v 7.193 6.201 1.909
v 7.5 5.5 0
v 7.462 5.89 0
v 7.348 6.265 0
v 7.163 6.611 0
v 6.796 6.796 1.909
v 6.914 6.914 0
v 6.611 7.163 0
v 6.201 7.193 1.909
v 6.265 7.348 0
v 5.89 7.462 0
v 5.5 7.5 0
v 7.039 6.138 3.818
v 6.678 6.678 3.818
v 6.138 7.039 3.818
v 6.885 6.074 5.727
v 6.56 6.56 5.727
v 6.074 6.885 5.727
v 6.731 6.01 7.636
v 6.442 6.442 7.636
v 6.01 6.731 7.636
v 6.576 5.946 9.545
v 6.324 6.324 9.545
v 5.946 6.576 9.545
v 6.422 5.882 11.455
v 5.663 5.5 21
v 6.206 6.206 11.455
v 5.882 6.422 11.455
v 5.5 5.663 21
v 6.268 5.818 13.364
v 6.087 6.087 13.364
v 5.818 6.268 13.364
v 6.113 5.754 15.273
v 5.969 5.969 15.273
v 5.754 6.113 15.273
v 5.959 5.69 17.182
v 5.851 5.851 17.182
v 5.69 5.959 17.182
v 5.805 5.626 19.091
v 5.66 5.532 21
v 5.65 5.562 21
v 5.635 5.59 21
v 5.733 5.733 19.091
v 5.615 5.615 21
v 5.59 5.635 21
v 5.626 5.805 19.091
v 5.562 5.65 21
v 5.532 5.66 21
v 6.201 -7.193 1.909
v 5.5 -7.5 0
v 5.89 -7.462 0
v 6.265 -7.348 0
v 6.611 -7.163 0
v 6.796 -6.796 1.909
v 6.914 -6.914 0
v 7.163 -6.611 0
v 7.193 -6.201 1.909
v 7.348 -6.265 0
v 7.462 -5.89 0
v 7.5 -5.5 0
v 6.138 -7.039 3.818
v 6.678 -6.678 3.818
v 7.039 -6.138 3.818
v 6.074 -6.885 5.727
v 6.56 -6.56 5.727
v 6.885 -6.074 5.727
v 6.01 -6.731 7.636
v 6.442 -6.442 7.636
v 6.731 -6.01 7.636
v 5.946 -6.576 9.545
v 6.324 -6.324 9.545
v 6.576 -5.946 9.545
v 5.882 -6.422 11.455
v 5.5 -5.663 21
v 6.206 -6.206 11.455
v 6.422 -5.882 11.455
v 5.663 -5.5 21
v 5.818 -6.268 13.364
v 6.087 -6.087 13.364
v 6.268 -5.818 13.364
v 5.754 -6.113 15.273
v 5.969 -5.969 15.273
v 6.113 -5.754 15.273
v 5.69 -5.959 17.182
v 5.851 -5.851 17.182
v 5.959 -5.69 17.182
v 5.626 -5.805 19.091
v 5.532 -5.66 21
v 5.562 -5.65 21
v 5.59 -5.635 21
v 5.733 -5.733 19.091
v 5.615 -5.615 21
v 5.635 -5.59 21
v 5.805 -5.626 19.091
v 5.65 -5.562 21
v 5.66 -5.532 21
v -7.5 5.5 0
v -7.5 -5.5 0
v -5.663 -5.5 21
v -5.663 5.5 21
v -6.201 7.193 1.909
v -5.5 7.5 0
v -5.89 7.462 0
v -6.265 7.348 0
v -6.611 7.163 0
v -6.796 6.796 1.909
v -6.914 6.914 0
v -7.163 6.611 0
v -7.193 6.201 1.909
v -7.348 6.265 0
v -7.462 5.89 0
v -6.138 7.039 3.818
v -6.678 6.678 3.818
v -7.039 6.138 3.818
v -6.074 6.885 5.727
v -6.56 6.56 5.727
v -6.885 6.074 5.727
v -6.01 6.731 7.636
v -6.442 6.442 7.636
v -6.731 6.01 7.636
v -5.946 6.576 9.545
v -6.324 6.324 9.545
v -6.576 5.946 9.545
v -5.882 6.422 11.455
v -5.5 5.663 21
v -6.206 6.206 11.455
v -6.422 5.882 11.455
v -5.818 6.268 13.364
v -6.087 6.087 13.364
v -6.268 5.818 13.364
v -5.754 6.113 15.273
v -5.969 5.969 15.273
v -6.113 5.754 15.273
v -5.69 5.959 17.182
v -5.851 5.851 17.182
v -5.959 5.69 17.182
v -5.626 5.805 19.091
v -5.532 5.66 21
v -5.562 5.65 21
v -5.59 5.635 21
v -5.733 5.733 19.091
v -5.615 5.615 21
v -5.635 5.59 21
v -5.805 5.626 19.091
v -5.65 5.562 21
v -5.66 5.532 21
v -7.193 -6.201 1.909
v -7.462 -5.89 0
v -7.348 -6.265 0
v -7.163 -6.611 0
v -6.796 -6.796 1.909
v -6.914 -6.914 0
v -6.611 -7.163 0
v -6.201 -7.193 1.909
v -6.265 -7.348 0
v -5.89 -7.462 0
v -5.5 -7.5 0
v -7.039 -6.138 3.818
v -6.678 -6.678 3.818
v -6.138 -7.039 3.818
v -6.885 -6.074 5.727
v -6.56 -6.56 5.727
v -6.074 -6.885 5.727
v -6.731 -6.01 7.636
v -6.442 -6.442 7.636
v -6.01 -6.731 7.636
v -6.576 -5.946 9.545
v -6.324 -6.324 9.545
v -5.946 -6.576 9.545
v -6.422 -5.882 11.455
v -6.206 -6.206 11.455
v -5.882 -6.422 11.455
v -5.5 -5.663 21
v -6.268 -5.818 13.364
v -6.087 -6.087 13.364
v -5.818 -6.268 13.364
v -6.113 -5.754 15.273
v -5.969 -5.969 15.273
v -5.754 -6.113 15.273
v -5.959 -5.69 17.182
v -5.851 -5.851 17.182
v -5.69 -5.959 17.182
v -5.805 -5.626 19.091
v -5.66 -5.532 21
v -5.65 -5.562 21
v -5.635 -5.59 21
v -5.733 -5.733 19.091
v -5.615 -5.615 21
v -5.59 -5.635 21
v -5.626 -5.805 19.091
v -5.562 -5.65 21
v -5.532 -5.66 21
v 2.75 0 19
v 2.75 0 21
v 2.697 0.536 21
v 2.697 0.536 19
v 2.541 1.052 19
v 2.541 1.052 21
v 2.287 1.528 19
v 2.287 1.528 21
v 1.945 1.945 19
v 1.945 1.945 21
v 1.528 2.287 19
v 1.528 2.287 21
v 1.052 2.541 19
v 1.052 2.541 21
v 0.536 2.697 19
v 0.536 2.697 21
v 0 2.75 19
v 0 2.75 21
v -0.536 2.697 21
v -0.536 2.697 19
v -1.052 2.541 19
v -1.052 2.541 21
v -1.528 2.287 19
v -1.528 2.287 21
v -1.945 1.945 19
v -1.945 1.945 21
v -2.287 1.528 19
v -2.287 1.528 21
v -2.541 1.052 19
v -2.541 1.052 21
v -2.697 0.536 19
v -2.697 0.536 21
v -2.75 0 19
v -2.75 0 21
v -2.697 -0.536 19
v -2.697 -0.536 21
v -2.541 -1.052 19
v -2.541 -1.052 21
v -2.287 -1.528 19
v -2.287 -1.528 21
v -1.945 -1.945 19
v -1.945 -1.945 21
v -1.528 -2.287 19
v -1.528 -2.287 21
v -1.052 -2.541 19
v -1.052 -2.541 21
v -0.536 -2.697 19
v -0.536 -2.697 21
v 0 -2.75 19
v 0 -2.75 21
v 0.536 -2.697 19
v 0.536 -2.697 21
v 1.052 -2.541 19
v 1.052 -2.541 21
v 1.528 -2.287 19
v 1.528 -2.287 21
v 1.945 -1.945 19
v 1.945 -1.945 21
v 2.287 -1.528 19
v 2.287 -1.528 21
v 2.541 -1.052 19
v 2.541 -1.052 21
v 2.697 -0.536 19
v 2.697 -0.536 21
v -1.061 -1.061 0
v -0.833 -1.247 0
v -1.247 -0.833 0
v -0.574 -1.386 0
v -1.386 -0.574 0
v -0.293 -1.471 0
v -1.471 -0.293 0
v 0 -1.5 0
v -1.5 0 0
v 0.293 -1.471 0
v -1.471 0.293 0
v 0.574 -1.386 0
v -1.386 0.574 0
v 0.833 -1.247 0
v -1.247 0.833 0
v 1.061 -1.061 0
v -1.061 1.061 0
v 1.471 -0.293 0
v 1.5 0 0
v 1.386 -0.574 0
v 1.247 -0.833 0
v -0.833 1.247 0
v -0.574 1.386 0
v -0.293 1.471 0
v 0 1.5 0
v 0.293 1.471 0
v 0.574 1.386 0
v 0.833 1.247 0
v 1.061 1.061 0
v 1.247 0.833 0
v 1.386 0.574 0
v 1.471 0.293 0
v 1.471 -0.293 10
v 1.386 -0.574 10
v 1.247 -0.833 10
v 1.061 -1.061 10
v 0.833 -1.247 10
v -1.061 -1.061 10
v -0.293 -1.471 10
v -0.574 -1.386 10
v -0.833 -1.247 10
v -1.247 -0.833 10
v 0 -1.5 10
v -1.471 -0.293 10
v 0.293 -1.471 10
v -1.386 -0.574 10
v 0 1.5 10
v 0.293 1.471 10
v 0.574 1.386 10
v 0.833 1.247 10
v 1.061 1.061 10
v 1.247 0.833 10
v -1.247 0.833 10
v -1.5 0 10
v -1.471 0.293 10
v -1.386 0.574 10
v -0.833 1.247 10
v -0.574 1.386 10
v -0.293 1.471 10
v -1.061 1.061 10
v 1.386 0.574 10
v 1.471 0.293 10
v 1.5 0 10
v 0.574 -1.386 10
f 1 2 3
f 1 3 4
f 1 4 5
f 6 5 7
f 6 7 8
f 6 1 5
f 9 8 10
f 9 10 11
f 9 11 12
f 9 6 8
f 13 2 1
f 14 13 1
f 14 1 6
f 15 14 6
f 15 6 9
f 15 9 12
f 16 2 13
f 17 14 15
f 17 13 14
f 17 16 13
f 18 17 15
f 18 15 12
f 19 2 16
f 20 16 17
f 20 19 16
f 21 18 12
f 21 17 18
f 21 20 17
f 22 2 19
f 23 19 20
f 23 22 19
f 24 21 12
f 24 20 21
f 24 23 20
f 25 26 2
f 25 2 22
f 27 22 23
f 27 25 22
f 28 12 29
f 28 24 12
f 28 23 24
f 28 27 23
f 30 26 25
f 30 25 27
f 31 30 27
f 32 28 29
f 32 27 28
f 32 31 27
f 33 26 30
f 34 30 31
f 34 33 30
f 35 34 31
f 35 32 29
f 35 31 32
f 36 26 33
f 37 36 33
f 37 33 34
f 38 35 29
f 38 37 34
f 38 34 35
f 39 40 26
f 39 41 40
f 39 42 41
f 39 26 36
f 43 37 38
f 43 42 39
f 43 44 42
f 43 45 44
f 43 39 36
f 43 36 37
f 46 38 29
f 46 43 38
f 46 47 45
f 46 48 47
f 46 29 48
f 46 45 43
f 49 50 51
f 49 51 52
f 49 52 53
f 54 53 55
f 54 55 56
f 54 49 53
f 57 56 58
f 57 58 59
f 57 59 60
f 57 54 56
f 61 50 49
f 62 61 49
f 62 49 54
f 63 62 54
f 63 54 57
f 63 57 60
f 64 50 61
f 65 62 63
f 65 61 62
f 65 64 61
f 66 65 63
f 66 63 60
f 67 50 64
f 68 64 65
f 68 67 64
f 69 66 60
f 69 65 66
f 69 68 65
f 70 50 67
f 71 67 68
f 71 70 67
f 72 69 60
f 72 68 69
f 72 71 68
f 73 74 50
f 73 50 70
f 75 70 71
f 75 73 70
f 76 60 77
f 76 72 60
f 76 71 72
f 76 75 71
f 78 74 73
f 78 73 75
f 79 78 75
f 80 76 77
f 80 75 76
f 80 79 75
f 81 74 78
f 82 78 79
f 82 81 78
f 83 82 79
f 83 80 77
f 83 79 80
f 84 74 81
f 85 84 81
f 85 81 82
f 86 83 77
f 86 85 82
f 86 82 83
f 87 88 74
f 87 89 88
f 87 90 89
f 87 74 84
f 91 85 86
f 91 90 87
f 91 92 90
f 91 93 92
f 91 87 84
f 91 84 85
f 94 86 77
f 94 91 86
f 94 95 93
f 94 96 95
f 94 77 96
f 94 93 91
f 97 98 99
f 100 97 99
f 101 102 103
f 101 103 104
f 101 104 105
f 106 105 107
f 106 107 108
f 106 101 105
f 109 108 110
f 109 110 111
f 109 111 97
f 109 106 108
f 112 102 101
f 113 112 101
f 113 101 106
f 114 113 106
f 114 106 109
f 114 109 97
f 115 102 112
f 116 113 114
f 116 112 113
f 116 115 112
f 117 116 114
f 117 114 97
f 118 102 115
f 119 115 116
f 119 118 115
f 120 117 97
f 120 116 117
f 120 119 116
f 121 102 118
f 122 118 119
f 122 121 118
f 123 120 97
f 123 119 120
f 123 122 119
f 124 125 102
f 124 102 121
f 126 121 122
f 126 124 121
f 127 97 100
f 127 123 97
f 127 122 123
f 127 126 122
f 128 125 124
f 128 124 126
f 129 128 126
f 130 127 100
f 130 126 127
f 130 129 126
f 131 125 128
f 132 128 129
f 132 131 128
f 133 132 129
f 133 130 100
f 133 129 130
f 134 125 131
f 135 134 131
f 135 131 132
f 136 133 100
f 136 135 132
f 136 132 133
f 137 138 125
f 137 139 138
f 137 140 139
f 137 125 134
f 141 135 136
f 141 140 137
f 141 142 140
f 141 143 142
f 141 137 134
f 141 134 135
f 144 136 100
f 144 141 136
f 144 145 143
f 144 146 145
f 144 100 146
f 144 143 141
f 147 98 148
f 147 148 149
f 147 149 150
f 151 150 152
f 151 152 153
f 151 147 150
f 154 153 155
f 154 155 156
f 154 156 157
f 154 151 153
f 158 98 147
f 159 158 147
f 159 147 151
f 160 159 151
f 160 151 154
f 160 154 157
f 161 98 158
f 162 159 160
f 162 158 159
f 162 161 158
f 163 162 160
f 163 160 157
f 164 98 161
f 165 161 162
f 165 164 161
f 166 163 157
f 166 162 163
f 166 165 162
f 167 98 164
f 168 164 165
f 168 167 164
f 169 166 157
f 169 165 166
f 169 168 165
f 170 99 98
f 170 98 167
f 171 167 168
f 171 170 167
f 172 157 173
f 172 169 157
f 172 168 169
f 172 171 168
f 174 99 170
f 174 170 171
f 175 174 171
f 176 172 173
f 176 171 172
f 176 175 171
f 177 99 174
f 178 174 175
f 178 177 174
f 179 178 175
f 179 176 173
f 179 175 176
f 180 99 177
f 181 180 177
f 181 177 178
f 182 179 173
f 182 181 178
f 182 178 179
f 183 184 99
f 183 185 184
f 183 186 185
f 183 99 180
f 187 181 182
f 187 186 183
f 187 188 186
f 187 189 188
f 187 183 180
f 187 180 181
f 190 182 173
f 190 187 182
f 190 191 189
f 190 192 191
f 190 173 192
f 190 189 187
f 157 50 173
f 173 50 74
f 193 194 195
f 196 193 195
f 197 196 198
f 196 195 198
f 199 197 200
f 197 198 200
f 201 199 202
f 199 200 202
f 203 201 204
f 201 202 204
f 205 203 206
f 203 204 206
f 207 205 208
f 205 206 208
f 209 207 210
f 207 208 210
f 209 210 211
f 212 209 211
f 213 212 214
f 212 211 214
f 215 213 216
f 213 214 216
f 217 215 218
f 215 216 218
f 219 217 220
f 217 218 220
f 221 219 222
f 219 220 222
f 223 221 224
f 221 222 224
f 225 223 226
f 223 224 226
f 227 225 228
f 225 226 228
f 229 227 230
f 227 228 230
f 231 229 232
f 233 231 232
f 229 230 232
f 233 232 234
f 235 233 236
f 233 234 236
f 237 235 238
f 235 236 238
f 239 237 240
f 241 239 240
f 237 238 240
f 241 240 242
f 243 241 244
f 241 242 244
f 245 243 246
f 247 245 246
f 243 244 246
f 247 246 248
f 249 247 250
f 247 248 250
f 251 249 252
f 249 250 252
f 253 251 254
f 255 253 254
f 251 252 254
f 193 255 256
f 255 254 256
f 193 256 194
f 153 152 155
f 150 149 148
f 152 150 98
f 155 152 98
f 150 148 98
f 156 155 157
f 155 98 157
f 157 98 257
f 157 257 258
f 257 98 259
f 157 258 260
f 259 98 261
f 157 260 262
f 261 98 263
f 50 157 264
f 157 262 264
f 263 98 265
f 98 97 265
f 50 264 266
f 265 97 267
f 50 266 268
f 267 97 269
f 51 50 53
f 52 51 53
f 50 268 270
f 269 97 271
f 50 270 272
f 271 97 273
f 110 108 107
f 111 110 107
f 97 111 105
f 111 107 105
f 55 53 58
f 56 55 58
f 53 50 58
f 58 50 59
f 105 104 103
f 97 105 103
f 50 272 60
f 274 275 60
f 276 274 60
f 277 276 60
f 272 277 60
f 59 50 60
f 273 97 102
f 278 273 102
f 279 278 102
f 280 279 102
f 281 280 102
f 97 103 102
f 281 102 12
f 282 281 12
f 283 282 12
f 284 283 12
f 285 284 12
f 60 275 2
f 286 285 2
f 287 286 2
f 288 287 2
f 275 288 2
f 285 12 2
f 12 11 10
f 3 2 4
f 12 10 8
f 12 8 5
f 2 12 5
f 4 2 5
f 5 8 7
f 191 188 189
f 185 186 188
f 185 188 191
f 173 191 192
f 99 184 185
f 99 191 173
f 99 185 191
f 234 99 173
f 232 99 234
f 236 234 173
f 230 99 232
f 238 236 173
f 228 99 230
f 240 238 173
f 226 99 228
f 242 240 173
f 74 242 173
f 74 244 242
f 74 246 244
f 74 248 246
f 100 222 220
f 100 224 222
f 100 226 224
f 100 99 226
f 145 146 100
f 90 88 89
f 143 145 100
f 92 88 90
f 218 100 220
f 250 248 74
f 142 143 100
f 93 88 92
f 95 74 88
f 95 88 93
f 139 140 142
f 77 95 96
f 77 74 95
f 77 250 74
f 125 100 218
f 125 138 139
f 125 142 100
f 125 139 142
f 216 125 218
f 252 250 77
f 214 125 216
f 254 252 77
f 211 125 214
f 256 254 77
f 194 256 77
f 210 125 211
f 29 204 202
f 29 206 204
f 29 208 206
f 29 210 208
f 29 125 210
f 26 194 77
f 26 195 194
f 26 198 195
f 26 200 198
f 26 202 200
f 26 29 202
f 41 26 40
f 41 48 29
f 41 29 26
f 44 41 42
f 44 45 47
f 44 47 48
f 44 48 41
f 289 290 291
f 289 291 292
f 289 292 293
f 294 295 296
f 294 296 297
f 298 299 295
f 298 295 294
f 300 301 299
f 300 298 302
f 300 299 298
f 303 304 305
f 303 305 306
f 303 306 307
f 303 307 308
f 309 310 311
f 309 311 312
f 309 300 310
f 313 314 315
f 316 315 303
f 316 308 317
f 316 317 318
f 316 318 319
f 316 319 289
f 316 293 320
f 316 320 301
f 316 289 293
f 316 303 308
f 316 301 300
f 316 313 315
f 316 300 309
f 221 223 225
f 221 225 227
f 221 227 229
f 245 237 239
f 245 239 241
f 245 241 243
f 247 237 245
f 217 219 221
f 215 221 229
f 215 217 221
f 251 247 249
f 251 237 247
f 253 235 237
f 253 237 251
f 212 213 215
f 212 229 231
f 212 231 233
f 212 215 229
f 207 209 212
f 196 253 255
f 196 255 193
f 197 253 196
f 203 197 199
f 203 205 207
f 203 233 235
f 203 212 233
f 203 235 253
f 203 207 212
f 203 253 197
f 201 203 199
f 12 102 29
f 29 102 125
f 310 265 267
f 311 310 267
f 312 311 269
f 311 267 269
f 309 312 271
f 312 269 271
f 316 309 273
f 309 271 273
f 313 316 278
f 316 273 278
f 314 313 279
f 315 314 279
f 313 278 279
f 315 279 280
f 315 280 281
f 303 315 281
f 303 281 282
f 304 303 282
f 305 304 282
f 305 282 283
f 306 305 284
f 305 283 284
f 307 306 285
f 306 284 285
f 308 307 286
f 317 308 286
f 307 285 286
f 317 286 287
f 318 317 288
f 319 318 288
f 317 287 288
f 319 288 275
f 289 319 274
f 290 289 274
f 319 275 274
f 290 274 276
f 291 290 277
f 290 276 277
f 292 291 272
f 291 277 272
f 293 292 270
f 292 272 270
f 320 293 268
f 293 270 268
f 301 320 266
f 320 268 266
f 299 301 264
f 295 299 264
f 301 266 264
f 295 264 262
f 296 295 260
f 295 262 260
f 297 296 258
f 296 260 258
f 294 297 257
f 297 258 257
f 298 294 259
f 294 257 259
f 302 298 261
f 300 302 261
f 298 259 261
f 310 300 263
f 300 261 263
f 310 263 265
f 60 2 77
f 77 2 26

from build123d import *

# Parameters (mm, degrees)
BOSS_EXTRUDE1_DEPTH = 21
BOSS_EXTRUDE1_TAPER = 5
SKETCH2_R           = 1.5
CUT_EXTRUDE1_DEPTH  = 10
SKETCH3_R           = 2.75
CUT_EXTRUDE2_DEPTH  = 2


with BuildPart() as part:
    # Sketch1 → Boss-Extrude1 (new body)
    with BuildSketch(Plane.XY):
        with BuildLine():
            Line((-5.5, -7.5), (5.5, -7.5))
            ThreePointArc((5.5, -7.5), (6.914213562, -6.914213562), (7.5, -5.5))
            Line((7.5, -5.5), (7.5, 5.5))
            ThreePointArc((7.5, 5.5), (6.914213562, 6.914213562), (5.5, 7.5))
            Line((5.5, 7.5), (-5.5, 7.5))
            ThreePointArc((-5.5, 7.5), (-6.914213562, 6.914213562), (-7.5, 5.5))
            Line((-7.5, 5.5), (-7.5, -5.5))
            ThreePointArc((-7.5, -5.5), (-6.914213562, -6.914213562), (-5.5, -7.5))
        make_face()
    extrude(amount=BOSS_EXTRUDE1_DEPTH, taper=BOSS_EXTRUDE1_TAPER)

    # Sketch2 → Cut-Extrude1 (cut)
    with BuildSketch(Plane(origin=(0, 0, 0), x_dir=(-1, 0, 0), z_dir=(0, 0, -1))):
        Circle(SKETCH2_R)
    extrude(amount=-CUT_EXTRUDE1_DEPTH, mode=Mode.SUBTRACT)

    # Sketch3 → Cut-Extrude2 (cut)
    with BuildSketch(Plane.XY.offset(21)):
        Circle(SKETCH3_R)
    extrude(amount=-CUT_EXTRUDE2_DEPTH, mode=Mode.SUBTRACT)


solid = part.part
